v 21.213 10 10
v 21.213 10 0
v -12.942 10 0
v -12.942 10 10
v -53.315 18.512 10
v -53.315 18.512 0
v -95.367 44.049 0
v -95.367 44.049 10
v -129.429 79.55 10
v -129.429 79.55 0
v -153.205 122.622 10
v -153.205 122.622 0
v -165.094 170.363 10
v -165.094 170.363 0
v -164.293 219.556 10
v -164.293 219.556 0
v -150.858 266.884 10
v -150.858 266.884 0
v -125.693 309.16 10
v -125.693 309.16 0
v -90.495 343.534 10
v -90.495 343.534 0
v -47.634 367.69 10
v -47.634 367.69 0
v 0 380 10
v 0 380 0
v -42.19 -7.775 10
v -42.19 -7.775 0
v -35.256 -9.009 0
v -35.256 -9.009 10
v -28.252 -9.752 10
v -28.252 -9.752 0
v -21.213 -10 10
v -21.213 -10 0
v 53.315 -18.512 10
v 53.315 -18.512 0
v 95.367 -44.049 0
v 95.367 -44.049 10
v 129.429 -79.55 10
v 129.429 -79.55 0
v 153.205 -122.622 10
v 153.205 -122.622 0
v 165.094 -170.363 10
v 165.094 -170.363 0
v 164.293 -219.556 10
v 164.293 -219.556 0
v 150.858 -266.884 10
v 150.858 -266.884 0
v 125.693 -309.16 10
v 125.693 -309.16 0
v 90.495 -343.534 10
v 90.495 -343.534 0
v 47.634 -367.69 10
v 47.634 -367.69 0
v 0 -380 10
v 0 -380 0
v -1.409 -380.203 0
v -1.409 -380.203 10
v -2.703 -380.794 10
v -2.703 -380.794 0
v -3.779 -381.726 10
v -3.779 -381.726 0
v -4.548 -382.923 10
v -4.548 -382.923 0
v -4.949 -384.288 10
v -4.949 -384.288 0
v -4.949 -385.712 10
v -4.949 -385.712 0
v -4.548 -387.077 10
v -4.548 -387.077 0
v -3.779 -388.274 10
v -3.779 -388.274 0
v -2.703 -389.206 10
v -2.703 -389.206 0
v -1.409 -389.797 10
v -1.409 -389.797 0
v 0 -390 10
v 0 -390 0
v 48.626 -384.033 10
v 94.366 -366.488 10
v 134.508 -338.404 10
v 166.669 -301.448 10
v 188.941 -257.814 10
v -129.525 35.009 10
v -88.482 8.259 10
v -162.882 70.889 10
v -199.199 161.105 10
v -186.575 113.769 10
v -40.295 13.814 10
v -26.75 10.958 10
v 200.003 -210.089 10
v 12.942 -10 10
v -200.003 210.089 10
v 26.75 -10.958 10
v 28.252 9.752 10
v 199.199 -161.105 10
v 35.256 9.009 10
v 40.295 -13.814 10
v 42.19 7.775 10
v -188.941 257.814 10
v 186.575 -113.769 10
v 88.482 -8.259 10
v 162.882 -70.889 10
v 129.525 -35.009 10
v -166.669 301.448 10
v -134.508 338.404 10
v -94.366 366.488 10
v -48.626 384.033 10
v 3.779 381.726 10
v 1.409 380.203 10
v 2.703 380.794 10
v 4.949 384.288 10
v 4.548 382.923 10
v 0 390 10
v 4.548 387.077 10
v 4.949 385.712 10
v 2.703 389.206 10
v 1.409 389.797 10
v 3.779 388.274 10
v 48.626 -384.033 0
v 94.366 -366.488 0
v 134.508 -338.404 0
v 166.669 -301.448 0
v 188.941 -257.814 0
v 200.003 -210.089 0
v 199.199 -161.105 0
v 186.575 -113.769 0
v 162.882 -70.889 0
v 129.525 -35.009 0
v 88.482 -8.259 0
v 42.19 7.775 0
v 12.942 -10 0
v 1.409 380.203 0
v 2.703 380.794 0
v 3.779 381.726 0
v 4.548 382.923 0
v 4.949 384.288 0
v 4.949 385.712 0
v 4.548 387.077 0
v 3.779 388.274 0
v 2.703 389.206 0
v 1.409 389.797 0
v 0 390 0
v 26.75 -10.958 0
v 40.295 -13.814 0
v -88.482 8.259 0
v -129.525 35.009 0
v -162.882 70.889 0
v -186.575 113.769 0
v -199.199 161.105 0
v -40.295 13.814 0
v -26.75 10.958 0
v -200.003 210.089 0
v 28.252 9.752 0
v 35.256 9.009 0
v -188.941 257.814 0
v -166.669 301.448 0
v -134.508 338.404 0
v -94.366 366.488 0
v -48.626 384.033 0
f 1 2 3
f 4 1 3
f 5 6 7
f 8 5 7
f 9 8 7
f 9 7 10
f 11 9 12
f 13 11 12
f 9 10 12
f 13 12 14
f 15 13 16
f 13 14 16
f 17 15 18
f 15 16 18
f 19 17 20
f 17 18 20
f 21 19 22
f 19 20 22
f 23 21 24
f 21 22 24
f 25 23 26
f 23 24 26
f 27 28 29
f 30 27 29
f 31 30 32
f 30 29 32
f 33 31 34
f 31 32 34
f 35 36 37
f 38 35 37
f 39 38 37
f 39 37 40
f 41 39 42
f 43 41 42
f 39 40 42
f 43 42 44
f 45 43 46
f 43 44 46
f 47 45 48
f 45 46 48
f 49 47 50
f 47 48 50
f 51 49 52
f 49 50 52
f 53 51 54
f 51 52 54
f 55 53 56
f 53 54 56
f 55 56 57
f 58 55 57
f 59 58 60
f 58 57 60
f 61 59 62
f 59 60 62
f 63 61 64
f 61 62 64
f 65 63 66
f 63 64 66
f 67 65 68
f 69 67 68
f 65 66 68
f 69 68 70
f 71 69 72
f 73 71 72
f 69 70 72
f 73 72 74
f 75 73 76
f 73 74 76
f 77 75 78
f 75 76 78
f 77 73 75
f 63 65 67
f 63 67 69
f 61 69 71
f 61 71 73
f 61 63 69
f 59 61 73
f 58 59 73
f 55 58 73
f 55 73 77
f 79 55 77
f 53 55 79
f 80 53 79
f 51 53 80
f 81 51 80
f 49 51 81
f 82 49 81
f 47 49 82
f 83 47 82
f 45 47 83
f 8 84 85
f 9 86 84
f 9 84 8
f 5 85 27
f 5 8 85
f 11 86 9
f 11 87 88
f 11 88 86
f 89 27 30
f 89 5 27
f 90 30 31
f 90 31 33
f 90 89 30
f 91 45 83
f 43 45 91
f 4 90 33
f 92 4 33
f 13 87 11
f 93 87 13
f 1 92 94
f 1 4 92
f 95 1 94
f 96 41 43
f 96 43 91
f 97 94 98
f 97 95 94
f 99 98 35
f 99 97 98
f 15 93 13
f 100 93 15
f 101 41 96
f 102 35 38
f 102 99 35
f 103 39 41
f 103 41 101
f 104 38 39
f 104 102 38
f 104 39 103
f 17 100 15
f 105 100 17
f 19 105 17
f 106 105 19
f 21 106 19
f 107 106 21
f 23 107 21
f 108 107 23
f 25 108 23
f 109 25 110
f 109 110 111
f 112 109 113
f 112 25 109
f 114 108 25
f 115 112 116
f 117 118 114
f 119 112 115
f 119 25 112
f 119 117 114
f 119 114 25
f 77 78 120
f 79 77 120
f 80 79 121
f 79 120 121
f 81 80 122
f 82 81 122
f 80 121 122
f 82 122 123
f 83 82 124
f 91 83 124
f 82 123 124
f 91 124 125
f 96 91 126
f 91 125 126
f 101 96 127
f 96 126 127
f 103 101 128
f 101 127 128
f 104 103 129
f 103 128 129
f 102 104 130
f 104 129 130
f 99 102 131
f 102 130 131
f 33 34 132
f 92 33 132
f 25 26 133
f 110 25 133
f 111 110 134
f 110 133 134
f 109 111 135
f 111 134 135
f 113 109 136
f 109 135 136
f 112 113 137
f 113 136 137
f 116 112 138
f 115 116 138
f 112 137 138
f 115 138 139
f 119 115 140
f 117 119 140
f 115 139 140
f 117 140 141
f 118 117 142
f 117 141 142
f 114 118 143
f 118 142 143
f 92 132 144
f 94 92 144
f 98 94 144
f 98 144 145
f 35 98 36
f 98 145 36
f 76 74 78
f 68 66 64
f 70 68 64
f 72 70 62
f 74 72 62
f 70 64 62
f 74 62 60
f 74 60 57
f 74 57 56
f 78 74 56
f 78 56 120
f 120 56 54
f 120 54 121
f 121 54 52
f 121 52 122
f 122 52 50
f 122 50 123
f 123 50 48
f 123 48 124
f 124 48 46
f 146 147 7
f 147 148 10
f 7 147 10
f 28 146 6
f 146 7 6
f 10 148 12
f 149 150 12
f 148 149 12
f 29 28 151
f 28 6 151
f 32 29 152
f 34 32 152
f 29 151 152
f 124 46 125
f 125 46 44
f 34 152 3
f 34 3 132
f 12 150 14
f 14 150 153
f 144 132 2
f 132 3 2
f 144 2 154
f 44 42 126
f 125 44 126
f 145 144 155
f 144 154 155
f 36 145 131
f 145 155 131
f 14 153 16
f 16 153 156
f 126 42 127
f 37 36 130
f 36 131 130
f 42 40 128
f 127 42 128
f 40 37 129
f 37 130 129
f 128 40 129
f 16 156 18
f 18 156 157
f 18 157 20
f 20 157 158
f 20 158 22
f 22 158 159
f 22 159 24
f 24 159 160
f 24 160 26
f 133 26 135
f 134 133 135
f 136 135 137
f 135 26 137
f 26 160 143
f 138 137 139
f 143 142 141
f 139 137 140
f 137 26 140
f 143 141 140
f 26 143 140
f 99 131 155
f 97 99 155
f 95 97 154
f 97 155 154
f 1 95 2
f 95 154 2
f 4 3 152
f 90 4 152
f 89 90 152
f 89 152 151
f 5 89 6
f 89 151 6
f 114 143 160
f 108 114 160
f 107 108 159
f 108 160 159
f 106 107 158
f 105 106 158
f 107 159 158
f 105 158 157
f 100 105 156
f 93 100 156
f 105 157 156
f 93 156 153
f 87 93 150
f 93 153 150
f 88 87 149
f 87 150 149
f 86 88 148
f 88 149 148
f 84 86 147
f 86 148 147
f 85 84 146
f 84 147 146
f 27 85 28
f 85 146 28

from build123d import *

# Parameters (mm, degrees)
F1_DEPTH = 10


with BuildPart() as f1:
    # F0 (on Top) → F1 (new body)
    with BuildSketch(Plane.XY):
        with BuildLine():
            ThreePointArc((0, 380), (5, 385), (0, 390))
            ThreePointArc((0, 390), (-200.003129, 210.088535), (-42.190413, -7.775031))
            ThreePointArc((-42.190413, -7.775031), (-31.760642, -9.442202), (-21.213203, -10))
            Line((-21.213203, -10), (0, -10))
            Line((0, -10), (12.941731, -10))
            ThreePointArc((12.941731, -10), (33.571927, -12.151162), (53.314545, -18.5121))
            ThreePointArc((53.314545, -18.5121), (164.293465, -219.555515), (0, -380))
            ThreePointArc((0, -380), (-5, -385), (0, -390))
            ThreePointArc((0, -390), (200.003129, -210.088535), (42.190413, 7.775031))
            ThreePointArc((42.190413, 7.775031), (31.760642, 9.442202), (21.213203, 10))
            Line((21.213203, 10), (0, 10))
            Line((0, 10), (-12.941731, 10))
            ThreePointArc((-12.941731, 10), (-33.571927, 12.151162), (-53.314545, 18.5121))
            ThreePointArc((-53.314545, 18.5121), (-164.293465, 219.555515), (0, 380))
        make_face()
    extrude(amount=F1_DEPTH)


solid = f1.part
